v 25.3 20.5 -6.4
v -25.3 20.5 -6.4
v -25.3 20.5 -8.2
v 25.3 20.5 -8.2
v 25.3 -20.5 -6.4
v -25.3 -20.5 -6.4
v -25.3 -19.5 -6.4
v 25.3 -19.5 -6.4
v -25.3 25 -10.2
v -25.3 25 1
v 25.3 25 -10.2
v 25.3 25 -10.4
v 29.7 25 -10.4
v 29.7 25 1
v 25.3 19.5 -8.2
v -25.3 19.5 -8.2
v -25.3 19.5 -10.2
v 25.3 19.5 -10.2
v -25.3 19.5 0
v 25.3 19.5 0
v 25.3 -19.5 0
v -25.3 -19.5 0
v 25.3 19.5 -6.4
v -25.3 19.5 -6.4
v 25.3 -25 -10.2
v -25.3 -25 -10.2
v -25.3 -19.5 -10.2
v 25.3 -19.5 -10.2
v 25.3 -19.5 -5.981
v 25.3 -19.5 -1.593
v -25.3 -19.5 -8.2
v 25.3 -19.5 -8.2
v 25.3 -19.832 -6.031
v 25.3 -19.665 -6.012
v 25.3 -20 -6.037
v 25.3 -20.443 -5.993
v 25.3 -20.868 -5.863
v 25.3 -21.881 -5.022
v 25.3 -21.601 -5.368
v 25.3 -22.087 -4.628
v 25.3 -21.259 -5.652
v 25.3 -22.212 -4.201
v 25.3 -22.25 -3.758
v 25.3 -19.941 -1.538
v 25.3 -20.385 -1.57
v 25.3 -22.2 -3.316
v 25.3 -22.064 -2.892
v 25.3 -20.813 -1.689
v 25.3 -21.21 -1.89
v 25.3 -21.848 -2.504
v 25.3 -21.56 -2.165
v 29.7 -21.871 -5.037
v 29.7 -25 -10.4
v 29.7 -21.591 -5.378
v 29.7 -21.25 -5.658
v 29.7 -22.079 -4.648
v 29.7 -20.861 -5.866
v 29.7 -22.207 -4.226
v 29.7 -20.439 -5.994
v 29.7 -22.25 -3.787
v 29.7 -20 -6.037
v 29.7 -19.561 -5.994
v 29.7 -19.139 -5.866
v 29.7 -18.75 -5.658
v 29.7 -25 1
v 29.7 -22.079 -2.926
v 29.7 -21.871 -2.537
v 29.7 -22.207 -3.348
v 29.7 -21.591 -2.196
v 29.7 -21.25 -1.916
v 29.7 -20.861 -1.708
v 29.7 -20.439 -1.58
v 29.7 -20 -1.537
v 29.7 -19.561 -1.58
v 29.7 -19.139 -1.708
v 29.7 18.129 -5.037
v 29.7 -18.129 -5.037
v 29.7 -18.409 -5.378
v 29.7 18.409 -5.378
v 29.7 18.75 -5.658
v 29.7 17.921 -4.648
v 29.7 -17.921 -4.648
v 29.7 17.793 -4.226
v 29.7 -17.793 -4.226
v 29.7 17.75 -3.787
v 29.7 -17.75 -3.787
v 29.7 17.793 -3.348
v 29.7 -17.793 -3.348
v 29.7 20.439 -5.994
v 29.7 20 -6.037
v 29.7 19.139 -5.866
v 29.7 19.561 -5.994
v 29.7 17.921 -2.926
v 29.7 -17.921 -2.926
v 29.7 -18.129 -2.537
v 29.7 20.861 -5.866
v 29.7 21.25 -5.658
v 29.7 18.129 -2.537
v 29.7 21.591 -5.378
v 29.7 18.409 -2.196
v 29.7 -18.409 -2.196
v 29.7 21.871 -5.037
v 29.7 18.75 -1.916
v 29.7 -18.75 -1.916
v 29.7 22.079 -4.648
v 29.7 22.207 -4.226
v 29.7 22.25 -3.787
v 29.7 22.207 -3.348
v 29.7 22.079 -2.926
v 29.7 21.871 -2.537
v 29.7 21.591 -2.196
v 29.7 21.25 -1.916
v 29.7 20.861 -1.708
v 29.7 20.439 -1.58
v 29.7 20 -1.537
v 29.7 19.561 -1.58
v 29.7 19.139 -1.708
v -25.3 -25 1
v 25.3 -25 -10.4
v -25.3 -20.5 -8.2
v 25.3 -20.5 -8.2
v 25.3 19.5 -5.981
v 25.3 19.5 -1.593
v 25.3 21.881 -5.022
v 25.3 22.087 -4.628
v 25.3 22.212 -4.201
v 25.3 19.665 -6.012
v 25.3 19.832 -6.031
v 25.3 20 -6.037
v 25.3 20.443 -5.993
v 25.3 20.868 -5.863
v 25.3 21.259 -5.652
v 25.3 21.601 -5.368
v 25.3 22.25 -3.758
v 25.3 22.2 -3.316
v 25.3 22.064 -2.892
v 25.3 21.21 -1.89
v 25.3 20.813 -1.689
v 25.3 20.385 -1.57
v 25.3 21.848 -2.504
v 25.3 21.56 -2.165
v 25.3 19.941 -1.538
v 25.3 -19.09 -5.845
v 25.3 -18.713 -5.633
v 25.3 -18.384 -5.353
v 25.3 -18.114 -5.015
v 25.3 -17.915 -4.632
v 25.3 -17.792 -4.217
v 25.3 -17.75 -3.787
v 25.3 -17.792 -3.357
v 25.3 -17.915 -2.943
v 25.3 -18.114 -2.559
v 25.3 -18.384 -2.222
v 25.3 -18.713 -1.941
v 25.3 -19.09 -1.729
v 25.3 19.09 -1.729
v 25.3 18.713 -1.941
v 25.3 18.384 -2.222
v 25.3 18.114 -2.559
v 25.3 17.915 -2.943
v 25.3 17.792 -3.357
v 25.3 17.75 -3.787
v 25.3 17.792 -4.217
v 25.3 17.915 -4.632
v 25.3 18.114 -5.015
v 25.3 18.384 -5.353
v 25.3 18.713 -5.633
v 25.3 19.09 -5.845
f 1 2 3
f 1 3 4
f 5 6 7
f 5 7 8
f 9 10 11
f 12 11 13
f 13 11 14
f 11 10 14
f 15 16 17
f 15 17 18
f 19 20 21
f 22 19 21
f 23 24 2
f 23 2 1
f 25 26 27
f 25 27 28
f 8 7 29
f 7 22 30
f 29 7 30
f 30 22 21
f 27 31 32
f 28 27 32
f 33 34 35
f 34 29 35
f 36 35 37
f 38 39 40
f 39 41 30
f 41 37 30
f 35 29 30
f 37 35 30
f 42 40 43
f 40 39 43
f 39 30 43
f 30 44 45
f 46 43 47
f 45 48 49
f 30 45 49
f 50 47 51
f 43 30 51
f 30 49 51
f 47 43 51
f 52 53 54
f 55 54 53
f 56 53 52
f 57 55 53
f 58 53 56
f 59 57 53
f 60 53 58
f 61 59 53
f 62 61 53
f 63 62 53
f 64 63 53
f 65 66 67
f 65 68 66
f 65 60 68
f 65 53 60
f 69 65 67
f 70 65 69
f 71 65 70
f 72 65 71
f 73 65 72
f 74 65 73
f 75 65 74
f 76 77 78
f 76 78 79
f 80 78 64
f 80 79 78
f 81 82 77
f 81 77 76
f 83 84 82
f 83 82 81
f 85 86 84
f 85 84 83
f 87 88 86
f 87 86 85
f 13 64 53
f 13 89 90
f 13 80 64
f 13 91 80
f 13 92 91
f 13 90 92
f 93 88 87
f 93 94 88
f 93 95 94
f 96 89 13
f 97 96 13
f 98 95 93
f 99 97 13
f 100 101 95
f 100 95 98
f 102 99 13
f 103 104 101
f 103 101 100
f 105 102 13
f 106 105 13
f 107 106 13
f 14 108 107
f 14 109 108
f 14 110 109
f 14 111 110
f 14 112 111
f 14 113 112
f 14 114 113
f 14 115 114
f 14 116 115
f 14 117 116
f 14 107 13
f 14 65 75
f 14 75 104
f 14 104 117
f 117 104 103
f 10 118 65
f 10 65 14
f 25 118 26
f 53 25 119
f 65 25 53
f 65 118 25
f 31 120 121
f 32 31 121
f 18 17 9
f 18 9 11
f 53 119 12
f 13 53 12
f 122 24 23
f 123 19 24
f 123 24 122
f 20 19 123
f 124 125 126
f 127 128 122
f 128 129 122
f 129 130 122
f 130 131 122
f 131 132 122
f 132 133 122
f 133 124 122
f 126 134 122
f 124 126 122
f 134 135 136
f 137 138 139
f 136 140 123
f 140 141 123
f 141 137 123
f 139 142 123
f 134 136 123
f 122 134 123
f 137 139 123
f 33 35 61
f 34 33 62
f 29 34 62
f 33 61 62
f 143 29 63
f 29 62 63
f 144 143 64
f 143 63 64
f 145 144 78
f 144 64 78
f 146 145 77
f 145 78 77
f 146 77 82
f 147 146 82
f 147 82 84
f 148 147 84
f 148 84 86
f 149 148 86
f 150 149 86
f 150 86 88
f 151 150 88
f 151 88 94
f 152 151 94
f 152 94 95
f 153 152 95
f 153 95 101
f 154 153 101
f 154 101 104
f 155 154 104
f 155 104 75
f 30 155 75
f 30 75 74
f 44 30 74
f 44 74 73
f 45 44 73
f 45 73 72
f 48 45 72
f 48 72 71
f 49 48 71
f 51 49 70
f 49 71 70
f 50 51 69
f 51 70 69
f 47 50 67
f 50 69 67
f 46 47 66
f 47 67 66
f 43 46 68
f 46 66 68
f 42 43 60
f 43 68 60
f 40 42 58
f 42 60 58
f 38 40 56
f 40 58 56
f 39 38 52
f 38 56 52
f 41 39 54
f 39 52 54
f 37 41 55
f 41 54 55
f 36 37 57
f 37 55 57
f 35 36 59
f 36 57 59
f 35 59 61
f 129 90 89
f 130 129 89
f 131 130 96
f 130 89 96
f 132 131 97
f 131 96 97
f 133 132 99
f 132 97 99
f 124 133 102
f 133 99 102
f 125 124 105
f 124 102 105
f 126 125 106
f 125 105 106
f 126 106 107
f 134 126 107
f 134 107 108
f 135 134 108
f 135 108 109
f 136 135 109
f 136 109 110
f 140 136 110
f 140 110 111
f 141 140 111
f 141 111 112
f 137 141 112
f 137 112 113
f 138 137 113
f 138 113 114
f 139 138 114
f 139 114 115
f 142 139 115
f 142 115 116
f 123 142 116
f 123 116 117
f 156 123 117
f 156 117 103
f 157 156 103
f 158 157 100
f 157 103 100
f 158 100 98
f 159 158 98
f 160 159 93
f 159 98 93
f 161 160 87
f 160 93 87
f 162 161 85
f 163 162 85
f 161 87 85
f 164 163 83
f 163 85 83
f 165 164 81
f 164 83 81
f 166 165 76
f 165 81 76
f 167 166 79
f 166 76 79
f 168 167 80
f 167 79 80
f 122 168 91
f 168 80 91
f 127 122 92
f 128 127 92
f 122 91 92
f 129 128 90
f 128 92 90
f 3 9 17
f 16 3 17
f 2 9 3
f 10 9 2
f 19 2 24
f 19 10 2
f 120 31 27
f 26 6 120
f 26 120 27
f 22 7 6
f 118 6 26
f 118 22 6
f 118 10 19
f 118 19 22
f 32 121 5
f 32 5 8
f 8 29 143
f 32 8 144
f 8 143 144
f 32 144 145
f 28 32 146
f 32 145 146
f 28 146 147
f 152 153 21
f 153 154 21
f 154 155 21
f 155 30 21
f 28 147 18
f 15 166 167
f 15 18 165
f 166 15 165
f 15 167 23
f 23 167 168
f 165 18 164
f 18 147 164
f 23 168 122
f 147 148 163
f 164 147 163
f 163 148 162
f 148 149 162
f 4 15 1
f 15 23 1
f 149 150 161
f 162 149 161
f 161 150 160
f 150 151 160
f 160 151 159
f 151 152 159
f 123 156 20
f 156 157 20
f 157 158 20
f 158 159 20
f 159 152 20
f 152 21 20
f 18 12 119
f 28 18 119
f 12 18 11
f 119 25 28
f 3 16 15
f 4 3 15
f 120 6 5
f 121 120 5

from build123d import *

# Parameters (mm, degrees)
BOSS_EXTRUDE1_DEPTH = 1
SKETCH2_W           = 50
SKETCH2_H           = 11.4
BOSS_EXTRUDE2_DEPTH = 4.4
SKETCH3_R           = 2.25
CUT_EXTRUDE1_DEPTH  = 4.4
SKETCH4_W           = 50.6
SKETCH4_H           = 5.5
BOSS_EXTRUDE3_DEPTH = 6.4
SKETCH5_W           = 50.6
SKETCH5_H           = 4.5
BOSS_EXTRUDE4_DEPTH = 1.8
SKETCH6_W           = 50.6
SKETCH6_H           = 5.5
BOSS_EXTRUDE5_DEPTH = 2


with BuildPart() as part:
    # Sketch1 → Boss-Extrude1 (new body)
    with BuildSketch(Plane(origin=(0, 0, 0), x_dir=(0, 1, 0), z_dir=(0, 0, 1))):
        Polygon((-25, 25.3), (19, 25.3), (25, 25.3), (25, -25.3), (-25, -25.3), align=None)
    extrude(amount=BOSS_EXTRUDE1_DEPTH)

    # Sketch2 → Boss-Extrude2 (add)
    with BuildSketch(Plane.YZ.offset(25.3)):
        with Locations((0, -4.7)):
            Rectangle(SKETCH2_W, SKETCH2_H)
    extrude(amount=BOSS_EXTRUDE2_DEPTH)

    # Sketch3 → Cut-Extrude1 (cut)
    with BuildSketch(Plane.YZ.offset(29.7)):
        with Locations(Location((-20, -3.787139035, 0), (0, 0, 270))):
            Circle(SKETCH3_R)
        with Locations(Location((20, -3.787139035, 0), (0, 0, 270))):
            Circle(SKETCH3_R)
    extrude(amount=-CUT_EXTRUDE1_DEPTH, mode=Mode.SUBTRACT)

    # Sketch4 → Boss-Extrude3 (add)
    with BuildSketch(Plane(origin=(0, 0, 0), x_dir=(1, 0, 0), z_dir=(0, 0, -1))):
        with Locations((0, -22.25)):
            Rectangle(SKETCH4_W, SKETCH4_H)
        with Locations((0, 22.25)):
            Rectangle(SKETCH4_W, SKETCH4_H)
    extrude(amount=BOSS_EXTRUDE3_DEPTH)

    # Sketch5 → Boss-Extrude4 (add)
    with BuildSketch(Plane(origin=(0, 0, -6.4), x_dir=(1, 0, 0), z_dir=(0, 0, -1))):
        with Locations((0, 22.75)):
            Rectangle(SKETCH5_W, SKETCH5_H)
        with Locations((0, -22.75)):
            Rectangle(SKETCH5_W, SKETCH5_H)
    extrude(amount=BOSS_EXTRUDE4_DEPTH)

    # Sketch6 → Boss-Extrude5 (add)
    with BuildSketch(Plane(origin=(0, 0, -8.2), x_dir=(1, 0, 0), z_dir=(0, 0, -1))):
        with Locations((0, -22.25)):
            Rectangle(SKETCH6_W, SKETCH6_H)
        with Locations((0, 22.25)):
            Rectangle(SKETCH6_W, SKETCH6_H)
    extrude(amount=BOSS_EXTRUDE5_DEPTH)


solid = part.part
